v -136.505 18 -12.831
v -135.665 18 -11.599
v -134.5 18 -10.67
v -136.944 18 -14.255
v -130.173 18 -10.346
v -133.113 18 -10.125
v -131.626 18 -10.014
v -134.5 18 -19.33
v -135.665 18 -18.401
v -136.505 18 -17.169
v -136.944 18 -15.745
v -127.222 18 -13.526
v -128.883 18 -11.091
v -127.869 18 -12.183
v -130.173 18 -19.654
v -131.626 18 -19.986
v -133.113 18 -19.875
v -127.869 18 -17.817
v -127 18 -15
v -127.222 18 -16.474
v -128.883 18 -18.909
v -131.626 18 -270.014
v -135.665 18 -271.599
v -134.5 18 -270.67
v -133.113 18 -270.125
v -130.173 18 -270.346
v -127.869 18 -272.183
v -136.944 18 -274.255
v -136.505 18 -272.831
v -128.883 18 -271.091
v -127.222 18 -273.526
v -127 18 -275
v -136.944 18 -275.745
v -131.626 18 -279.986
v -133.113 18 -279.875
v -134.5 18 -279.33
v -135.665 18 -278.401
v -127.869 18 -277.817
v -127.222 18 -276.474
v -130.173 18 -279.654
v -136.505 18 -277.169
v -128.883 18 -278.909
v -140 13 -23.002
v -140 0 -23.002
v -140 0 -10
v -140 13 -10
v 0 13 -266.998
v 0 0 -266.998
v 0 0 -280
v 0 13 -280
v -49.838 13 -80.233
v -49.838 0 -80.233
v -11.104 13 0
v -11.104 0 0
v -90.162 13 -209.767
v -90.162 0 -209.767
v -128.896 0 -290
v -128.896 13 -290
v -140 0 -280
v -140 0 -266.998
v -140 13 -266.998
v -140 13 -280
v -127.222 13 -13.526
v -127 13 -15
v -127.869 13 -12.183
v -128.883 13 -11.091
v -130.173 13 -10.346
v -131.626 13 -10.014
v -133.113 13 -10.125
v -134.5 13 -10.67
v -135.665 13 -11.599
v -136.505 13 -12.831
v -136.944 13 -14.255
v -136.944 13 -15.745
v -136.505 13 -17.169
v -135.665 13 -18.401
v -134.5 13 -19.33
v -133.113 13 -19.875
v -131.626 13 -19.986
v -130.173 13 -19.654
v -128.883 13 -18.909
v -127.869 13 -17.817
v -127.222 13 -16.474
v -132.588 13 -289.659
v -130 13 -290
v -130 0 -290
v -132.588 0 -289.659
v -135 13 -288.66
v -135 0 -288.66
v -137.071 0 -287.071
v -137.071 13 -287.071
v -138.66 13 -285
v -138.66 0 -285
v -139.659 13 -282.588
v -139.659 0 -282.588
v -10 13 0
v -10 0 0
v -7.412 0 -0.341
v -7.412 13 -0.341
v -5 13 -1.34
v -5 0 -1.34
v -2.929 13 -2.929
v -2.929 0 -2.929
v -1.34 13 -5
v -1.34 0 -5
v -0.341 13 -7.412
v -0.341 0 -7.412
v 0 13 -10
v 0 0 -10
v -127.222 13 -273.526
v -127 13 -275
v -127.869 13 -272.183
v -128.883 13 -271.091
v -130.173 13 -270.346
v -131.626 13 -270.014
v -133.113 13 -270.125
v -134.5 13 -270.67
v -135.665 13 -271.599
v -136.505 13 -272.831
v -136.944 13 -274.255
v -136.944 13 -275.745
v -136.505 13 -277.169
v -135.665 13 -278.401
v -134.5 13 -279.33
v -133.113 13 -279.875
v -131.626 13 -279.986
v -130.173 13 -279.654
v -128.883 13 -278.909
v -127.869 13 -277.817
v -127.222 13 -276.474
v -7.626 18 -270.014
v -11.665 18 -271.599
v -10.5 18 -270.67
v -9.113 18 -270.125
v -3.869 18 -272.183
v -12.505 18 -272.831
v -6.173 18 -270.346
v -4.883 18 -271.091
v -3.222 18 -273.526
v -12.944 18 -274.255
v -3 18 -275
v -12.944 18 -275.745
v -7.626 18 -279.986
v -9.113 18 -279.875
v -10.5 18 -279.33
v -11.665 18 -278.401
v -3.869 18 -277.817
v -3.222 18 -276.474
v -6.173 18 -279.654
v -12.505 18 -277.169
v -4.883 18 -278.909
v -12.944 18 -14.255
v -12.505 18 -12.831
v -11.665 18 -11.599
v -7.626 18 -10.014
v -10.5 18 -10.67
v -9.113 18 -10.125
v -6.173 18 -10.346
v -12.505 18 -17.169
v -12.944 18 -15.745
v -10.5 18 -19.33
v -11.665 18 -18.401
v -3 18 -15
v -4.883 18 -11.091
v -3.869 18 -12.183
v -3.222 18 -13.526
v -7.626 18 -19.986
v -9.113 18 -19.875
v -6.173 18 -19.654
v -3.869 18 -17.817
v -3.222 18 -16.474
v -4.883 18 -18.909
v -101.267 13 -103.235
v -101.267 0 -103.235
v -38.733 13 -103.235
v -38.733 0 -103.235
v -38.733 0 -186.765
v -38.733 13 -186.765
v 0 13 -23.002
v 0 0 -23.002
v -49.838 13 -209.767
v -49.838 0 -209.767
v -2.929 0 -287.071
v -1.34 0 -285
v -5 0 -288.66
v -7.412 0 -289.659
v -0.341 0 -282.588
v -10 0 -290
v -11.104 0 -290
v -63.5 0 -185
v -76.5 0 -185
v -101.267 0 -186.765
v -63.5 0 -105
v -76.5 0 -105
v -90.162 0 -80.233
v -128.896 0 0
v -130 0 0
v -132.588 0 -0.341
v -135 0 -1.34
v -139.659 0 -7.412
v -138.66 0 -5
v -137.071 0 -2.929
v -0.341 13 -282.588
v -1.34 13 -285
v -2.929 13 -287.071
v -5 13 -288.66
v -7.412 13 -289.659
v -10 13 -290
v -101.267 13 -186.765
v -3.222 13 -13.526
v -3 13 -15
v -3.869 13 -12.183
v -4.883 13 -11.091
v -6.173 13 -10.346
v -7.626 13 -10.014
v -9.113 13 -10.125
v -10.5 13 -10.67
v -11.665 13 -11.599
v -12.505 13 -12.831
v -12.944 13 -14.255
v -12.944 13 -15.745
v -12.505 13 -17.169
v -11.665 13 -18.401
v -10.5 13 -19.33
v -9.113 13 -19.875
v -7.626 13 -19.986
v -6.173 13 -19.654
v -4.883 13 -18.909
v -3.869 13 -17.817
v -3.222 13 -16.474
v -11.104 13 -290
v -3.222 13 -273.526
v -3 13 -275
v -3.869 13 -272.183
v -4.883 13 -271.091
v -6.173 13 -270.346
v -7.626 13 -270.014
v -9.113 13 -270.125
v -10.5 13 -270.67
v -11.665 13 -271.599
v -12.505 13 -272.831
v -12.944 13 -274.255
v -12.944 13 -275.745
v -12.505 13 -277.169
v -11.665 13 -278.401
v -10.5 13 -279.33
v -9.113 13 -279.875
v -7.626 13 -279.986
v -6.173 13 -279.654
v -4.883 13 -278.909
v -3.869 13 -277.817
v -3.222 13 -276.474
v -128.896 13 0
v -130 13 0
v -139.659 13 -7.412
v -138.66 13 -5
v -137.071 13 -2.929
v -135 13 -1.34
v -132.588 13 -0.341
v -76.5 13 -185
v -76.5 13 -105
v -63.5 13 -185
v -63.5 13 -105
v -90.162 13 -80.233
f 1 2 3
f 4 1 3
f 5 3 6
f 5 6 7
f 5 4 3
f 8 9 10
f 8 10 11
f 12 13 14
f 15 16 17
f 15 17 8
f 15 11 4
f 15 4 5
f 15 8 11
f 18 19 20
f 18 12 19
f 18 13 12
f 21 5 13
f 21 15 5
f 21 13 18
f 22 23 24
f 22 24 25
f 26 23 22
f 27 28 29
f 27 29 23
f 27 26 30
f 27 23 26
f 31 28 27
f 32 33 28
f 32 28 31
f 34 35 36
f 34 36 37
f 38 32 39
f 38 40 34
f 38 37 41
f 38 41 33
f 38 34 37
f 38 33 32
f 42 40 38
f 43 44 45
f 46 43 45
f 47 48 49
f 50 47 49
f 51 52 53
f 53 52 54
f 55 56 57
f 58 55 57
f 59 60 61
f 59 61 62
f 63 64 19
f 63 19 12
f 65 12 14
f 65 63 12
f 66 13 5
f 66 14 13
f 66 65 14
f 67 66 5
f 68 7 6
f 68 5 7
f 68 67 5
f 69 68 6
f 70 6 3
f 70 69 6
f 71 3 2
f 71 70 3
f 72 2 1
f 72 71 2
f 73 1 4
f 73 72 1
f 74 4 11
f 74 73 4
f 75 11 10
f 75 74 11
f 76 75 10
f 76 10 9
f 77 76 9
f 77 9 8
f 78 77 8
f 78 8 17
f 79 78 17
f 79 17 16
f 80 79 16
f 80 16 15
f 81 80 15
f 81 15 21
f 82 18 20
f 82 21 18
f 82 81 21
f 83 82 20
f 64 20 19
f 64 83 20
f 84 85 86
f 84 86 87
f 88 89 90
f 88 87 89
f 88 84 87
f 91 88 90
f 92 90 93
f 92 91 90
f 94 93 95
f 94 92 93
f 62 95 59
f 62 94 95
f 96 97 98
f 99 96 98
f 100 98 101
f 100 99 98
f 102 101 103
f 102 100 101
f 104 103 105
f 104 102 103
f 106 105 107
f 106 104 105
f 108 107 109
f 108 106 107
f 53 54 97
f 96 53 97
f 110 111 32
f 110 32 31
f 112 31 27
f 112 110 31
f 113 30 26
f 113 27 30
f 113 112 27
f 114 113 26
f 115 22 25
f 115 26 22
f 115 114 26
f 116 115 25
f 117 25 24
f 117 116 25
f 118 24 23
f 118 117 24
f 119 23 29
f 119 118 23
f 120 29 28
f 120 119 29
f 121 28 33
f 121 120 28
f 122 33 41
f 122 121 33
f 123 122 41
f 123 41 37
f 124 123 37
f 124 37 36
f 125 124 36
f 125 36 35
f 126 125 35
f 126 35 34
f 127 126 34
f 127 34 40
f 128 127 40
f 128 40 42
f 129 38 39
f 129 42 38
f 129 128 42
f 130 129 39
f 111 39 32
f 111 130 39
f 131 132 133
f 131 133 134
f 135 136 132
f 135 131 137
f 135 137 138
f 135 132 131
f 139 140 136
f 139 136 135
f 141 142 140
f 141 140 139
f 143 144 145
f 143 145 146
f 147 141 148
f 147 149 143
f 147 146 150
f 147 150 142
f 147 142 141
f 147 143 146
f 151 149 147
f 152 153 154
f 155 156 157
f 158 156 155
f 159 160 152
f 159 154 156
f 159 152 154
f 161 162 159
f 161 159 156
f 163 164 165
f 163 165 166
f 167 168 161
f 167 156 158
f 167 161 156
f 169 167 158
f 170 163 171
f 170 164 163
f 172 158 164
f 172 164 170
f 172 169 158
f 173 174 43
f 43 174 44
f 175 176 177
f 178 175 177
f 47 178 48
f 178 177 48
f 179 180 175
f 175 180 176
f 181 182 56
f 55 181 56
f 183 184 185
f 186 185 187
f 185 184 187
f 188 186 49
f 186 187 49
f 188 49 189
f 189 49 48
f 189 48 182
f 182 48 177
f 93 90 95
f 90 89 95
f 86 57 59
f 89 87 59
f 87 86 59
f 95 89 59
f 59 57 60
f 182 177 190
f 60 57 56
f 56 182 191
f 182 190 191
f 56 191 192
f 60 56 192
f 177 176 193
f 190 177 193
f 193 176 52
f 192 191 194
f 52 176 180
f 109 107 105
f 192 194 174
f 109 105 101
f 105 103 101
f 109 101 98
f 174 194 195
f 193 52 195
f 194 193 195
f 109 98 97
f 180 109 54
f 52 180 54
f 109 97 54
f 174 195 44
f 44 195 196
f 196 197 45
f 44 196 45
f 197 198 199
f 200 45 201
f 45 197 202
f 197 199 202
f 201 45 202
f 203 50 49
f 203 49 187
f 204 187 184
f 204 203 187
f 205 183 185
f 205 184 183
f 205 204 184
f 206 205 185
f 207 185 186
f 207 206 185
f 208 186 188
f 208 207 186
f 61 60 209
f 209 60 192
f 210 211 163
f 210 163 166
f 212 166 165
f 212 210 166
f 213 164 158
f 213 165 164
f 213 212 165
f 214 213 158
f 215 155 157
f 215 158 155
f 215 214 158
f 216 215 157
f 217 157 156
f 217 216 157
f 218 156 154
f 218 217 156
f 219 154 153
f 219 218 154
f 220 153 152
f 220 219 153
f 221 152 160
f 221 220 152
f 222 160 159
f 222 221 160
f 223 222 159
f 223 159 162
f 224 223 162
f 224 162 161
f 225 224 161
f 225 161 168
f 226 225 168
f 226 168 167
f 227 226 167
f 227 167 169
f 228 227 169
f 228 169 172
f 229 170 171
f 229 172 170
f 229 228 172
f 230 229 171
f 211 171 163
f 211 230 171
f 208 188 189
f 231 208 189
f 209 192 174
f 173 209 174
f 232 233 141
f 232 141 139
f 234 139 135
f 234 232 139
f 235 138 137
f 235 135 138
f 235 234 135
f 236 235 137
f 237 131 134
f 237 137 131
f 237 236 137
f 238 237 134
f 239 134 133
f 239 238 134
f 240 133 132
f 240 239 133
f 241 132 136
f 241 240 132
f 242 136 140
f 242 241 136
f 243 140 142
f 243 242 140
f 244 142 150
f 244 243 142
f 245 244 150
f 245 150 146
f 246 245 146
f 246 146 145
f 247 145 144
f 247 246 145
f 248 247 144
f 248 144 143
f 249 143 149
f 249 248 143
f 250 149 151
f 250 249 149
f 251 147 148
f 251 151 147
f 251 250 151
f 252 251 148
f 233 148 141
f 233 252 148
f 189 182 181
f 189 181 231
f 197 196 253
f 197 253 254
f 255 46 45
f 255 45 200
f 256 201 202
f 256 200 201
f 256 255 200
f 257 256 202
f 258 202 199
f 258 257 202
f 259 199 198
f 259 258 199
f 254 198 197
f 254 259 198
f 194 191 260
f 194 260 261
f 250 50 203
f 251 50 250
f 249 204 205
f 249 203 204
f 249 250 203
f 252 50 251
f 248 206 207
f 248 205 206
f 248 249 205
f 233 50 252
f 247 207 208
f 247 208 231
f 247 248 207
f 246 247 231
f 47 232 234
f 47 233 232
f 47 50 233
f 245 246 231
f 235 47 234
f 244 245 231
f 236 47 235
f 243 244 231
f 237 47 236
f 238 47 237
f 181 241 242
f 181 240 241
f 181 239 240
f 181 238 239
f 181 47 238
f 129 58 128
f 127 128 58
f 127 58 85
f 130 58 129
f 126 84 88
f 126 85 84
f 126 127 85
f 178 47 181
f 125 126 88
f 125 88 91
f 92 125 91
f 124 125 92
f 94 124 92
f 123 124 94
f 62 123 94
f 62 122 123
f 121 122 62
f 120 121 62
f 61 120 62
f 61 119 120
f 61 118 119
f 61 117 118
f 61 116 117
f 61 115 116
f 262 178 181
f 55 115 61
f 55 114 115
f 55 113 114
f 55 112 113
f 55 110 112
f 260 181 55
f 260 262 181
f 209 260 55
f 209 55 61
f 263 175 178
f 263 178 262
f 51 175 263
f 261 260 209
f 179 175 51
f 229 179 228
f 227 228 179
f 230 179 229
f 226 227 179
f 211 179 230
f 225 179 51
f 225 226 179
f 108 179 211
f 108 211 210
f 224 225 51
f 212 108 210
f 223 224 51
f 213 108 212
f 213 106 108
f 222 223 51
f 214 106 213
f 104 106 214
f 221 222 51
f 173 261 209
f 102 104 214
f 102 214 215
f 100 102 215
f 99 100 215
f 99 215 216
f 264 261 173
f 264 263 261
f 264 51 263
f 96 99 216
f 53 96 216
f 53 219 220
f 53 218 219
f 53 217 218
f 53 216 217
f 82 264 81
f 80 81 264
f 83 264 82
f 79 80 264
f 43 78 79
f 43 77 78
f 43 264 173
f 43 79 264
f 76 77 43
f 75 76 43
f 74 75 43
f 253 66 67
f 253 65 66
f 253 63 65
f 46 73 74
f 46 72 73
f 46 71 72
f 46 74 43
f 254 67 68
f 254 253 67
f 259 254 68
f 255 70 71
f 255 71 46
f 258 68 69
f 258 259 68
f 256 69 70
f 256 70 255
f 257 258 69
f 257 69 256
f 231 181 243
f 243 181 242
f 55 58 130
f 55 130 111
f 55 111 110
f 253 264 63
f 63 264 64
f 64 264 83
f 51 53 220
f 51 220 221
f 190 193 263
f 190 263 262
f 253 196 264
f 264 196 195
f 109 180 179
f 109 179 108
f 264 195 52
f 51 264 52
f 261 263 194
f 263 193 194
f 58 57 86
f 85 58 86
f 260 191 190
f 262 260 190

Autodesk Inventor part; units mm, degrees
ref_plane "YZ Plane" through (0, 0, 0) normal (1, 0, 0) x (0, 1, 0)
ref_plane "XZ Plane" through (0, 0, 0) normal (0, 1, 0) x (-1, 0, 0)
ref_plane "XY Plane" through (0, 0, 0) normal (0, 0, 1) x (1, 0, 0)
sketch "Sketch1" plane through (0, 0, 0) normal (0, 1, 0) x (-1, 0, 0)
  line L0 (0, 0) -> (140, 0) construction
  line L1 (140, 0) -> (140, -290) construction
  line L2 (140, -290) -> (0, -290) construction
  line L3 (0, -290) -> (0, 0) construction
  line L4 (0, 0) -> (140, -290) construction
  line L5 (11.1043, 0) -> (140, -266.9982) construction
  line L6 (0, -23.0018) -> (128.8957, -290) construction
  line L7 (-10, -2.2875) -> (-10, 0)
  line L8 (140, 0) -> (0, -290) construction
  line L9 (140, -23.0018) -> (11.1043, -290) construction
  line L10 (128.8957, 0) -> (0, -266.9982) construction
  line L11 (150, -2.2875) -> (150, 0)
  line L12 (0, -23.0018) -> (0, 0)
  line L13 (140, -23.0018) -> (140, 0)
  line L14 (140, -266.9982) -> (140, -290)
  line L15 (0, -266.9982) -> (0, -290)
  line L16 (76.5, -105) -> (63.5, -105) construction
  line L17 (63.5, -105) -> (63.5, -185) construction
  line L18 (63.5, -185) -> (76.5, -185) construction
  line L19 (76.5, -185) -> (76.5, -105) construction
  line L20 (101.2667, -80.2333) -> (38.7333, -80.2333) construction
  line L21 (38.7333, -80.2333) -> (38.7333, -209.7667) construction
  line L22 (38.7333, -209.7667) -> (101.2667, -209.7667) construction
  line L23 (101.2667, -209.7667) -> (101.2667, -80.2333) construction
  line L24 (0, -23.0018) -> (38.7333, -103.2351)
  line L25 (38.7333, -186.7649) -> (0, -266.9982)
  line L26 (0, -290) -> (11.1043, -290)
  line L27 (49.8376, -209.7667) -> (90.1624, -209.7667)
  line L28 (49.8376, -209.7667) -> (11.1043, -290)
  line L29 (38.7333, -103.2351) -> (38.7333, -186.7649)
  line L30 (90.1624, -209.7667) -> (128.8957, -290)
  line L31 (128.8957, -290) -> (140, -290)
  line L32 (140, -266.9982) -> (101.2667, -186.7649)
  line L33 (101.2667, -186.7649) -> (101.2667, -103.2351)
  line L34 (101.2667, -103.2351) -> (140, -23.0018)
  line L35 (128.8957, 0) -> (90.1624, -80.2333)
  line L36 (90.1624, -80.2333) -> (49.8376, -80.2333)
  line L37 (49.8376, -80.2333) -> (11.1043, 0)
  line L38 (11.1043, 0) -> (0, 0)
  line L39 (128.8957, 0) -> (140, 0)
  line L40 (63.5, -105) -> (76.5, -105)
  line L41 (76.5, -185) -> (63.5, -185)
  line L42 (63.5, -105) -> (63.5, -185)
  line L43 (76.5, -185) -> (76.5, -105)
  point P0 (70, -105)
  point P1 (70, 0)
  point P2 (140, -145)
  point P3 (76.5, -145)
  dimension "d0" = 140
  dimension "d1" = 290
  dimension "d2" = 10
  dimension "d3" = 10
  dimension "d4" = 10
  dimension "d5" = 10
  dimension "d6" = 13
  dimension "d7" = 80
extrude "Extrusion1" add sketch "Sketch1" along normal blind 13
fillet "Fillet1" radius 10 4 edges at (-140, 6.5, -290) (0, 6.5, -290) (0, 6.5, 0) (-140, 6.5, 0)
sketch "Sketch2" plane through (0, 13, 0) normal (0, 1, 0) x (1, 0, 0)
  circle A0 centre (-8, 275) radius 5
  line L0 (-10, 290) -> (-11.1043, 290) projected
  line L1 (0, 266.9982) -> (0, 280) construction
  line L2 (-70, 345.1807) -> (-70, -192.6697) construction
  line L3 (0, 10) -> (0, 23.0018) construction
  line L4 (-90.1624, 80.2333) -> (-49.8376, 80.2333) construction
  circle A1 centre (-132, 275) radius 5
  line L5 (-255.5862, 145) -> (85.936, 145)
  line L6 (-38.7333, 103.2351) -> (-38.7333, 186.7649) construction
  circle A2 centre (-8, 15) radius 5
  circle A3 centre (-132, 15) radius 5
  point P0 (0, 0)
  point P1 (-70, 80.2333)
  point P2 (-38.7333, 145)
  dimension "d11" = 10
  dimension "d12" = 15
  dimension "d13" = 8
  dimension "d14" = 537.8504
  dimension "d15" = 341.5222
extrude "Extrusion2" add sketch "Sketch2" along normal blind 5
properties part number "SoportePlaca" material "Rubber, Silicone"
